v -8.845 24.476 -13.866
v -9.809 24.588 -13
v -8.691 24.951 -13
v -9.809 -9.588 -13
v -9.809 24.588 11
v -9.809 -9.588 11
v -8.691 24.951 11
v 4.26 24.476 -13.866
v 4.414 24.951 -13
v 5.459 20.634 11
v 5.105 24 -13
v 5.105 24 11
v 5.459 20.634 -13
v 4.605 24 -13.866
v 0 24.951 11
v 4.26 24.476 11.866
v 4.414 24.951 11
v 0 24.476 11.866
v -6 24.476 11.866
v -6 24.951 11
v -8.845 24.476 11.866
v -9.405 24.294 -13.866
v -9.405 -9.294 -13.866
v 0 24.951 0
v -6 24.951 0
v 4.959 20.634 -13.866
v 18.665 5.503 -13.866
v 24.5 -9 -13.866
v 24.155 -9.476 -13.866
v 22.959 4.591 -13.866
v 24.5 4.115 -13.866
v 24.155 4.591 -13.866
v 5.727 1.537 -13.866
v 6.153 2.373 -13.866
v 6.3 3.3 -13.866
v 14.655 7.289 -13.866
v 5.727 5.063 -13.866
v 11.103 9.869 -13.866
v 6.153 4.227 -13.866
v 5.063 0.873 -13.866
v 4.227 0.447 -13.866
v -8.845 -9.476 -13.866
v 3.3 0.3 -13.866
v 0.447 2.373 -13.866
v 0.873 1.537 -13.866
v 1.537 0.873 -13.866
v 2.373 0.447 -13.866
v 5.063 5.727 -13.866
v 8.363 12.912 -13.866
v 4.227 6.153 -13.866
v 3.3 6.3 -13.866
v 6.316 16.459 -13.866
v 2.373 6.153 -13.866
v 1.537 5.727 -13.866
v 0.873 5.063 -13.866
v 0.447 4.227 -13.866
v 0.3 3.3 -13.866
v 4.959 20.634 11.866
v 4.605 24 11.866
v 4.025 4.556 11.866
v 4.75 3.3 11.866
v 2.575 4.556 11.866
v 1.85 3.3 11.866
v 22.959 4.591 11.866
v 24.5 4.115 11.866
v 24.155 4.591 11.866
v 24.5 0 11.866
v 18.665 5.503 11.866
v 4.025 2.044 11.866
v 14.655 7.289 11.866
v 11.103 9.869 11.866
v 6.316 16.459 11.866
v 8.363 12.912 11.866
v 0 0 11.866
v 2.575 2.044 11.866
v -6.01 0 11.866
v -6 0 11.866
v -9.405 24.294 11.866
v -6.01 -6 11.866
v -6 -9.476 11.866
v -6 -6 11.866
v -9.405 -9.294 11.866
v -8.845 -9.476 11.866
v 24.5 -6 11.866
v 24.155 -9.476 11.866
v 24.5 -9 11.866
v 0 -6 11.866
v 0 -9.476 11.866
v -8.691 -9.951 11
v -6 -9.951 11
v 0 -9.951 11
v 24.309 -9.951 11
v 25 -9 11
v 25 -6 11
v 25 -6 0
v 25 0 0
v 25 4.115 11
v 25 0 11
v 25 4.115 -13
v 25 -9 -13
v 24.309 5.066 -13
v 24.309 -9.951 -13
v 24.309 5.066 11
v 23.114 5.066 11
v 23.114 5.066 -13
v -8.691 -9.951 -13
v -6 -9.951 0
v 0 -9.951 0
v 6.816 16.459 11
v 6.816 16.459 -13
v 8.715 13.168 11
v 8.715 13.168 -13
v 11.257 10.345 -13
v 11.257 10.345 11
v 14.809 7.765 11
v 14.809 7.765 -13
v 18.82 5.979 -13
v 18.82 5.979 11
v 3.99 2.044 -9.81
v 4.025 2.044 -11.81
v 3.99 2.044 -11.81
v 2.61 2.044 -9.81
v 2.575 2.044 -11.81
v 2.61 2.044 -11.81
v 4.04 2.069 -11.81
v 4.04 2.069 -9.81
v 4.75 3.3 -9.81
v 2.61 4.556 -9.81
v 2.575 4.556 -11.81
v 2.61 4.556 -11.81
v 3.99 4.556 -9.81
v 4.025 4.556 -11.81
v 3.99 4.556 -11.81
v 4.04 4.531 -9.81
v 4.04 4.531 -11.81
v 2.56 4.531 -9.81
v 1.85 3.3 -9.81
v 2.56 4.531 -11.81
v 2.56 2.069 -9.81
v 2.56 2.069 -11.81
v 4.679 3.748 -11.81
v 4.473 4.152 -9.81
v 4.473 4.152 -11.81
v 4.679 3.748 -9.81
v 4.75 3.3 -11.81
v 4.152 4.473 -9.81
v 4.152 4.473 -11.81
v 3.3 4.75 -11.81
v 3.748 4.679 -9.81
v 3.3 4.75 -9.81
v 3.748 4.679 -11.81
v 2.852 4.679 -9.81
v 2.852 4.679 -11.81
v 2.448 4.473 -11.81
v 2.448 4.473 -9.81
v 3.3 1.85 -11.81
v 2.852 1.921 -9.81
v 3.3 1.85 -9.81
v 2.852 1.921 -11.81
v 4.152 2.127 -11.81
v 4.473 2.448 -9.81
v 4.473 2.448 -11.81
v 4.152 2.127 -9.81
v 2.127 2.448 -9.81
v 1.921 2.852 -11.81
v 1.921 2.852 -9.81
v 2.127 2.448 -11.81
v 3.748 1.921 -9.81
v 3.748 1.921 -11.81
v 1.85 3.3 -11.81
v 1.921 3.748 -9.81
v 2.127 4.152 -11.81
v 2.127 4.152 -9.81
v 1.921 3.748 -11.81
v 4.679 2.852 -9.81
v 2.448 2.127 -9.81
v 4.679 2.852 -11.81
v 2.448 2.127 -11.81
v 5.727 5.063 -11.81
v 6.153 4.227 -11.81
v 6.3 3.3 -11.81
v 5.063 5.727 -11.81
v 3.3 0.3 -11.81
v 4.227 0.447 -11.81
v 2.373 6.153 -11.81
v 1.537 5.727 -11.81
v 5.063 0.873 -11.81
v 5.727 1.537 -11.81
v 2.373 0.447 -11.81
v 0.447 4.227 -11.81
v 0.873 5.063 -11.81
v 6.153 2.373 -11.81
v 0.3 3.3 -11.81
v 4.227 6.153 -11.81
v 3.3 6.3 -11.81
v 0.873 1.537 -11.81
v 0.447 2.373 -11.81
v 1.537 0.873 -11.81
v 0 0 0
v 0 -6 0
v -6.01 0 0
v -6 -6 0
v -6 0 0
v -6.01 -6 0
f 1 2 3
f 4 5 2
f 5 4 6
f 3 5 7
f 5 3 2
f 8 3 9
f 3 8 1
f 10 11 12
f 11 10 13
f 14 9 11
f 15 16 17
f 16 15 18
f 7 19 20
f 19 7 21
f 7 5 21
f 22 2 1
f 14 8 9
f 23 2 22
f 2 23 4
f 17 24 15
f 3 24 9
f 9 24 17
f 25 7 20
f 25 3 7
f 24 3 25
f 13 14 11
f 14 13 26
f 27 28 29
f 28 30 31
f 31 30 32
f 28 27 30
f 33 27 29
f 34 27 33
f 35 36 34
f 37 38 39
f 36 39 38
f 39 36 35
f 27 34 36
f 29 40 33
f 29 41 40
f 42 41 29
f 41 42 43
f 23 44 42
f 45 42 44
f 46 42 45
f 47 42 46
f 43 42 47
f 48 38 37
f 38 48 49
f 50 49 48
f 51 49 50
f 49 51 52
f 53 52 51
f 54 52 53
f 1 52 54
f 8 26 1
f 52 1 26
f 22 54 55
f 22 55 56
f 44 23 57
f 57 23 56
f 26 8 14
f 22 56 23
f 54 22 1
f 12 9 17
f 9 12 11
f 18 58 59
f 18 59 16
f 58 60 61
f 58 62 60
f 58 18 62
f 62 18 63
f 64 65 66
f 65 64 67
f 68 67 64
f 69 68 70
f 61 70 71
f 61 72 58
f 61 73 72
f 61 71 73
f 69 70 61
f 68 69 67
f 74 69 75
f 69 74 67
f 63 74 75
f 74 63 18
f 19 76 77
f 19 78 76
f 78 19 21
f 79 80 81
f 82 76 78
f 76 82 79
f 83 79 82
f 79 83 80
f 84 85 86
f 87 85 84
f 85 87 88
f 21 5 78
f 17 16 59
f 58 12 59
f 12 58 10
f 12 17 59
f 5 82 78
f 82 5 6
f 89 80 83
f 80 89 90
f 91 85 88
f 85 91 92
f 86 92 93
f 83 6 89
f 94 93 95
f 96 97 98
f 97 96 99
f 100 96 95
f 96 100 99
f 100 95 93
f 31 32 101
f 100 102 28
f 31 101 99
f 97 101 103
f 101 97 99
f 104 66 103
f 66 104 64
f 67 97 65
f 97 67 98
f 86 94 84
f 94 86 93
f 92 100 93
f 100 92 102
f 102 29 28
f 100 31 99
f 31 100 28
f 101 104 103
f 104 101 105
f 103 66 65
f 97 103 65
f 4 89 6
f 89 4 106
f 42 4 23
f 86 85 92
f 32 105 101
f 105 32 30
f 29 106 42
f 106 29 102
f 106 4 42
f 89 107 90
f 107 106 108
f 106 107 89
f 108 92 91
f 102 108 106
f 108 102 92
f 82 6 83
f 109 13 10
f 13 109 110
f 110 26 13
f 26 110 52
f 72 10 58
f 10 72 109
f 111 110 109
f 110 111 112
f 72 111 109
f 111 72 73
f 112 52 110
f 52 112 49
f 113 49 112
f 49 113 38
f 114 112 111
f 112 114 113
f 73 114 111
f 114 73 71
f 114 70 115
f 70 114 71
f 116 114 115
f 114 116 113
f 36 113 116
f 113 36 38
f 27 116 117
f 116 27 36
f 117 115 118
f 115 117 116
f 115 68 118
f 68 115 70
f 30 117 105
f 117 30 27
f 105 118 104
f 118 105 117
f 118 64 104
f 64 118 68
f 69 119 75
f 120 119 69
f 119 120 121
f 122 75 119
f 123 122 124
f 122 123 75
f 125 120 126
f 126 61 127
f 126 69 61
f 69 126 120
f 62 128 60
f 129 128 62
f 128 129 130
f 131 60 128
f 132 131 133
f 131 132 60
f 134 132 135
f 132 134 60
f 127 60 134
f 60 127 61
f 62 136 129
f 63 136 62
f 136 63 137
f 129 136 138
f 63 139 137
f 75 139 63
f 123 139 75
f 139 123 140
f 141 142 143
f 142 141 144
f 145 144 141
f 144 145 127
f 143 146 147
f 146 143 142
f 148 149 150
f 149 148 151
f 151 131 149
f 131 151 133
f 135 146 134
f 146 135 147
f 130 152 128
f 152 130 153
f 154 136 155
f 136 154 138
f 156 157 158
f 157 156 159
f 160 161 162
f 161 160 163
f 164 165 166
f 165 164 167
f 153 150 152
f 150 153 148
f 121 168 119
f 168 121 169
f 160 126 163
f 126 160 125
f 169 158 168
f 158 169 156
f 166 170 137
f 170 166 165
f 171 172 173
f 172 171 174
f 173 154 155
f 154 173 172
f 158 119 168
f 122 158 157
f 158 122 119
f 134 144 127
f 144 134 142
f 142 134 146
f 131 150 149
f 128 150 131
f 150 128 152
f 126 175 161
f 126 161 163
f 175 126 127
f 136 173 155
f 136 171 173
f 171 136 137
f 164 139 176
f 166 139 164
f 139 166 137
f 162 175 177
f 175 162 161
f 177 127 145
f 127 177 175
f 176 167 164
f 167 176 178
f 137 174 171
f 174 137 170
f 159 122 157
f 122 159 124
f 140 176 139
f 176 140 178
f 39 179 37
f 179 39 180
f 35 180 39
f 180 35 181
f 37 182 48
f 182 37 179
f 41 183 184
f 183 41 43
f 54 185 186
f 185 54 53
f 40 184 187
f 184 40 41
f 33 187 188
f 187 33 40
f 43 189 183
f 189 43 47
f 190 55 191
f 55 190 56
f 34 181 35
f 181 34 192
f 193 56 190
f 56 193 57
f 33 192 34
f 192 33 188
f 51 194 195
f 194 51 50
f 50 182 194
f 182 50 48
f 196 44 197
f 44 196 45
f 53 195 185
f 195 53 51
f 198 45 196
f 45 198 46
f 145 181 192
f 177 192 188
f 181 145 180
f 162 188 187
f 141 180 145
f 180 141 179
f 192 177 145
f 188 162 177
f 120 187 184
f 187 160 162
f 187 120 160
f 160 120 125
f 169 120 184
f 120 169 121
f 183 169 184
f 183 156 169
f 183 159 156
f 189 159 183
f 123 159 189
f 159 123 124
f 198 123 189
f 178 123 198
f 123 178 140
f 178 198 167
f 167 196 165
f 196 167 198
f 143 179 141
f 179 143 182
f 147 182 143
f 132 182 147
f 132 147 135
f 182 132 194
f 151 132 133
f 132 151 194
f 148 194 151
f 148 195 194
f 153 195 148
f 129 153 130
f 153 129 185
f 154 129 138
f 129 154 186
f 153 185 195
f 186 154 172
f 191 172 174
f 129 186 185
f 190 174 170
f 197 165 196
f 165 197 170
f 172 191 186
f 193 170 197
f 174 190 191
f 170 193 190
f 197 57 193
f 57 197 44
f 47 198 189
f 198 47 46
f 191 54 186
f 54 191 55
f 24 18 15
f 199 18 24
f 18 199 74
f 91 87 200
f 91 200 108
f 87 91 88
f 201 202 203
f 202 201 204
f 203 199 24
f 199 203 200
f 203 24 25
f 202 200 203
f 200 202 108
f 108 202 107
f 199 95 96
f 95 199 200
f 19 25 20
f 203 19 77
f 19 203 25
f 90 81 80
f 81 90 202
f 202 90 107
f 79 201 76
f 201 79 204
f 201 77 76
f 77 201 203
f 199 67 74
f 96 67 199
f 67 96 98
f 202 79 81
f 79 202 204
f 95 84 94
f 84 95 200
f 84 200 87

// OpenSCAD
// The real added height
bottomHeight=14;

// Internal height (snug fit)
internalHeight=12;

// Rounded corner radius
roundness=1;

// How big is the thing in the horizontal plane
cubeSide= 25;

// Wall thickness
outSide= 4;

// Plywood thickness
plyWidth= 6;



// This is rev 2 for thingiverse customizer
// MoonCactus / jeremie.francois@gmail.com / betterprinter.blogspot.com

// The screw data match a standard UM spare
screwDiameter=2.9+0;
screwDistToWalls=0.8+0;
screwHeadDiameter=6+0;
screwHeadDepth=2.2+0;

tol=0.01+0;

translate([-plyWidth-outSide,-plyWidth-outSide,0])
{
	difference()
	{

		minkowski()
		{
			sphere(r=1); // round the main body shape
			difference()
			{

				// Main body
				translate([roundness,roundness,-bottomHeight+roundness])
					cube([cubeSide + plyWidth + outSide -roundness*2, cubeSide + plyWidth + outSide -roundness*2, internalHeight+bottomHeight -roundness*2]);
				// Main cylinder removal
				translate([cubeSide + plyWidth + outSide, cubeSide + plyWidth + outSide,-bottomHeight+roundness-tol])
					cylinder(r=cubeSide-outSide, h=internalHeight+bottomHeight-roundness*2+tol*2);
			}
		}

		// The two grooves (one of them being blind on one side)
		translate([outSide,-tol,0]) cube([plyWidth, cubeSide+plyWidth+outSide+tol*2, internalHeight+tol]);
		translate([-tol+outSide,outSide,0]) cube([cubeSide+plyWidth+tol*2, plyWidth, internalHeight+tol]);

		// Hole for a screw to attach a rubber pad AND to pushes the feet wals against that of the UM for stickier fit
		translate([cubeSide/2+screwDistToWalls, cubeSide/2+screwDistToWalls,-bottomHeight-tol])
		{
			cylinder(r=screwDiameter/2, h=internalHeight+bottomHeight+tol*2, $fn=6);
			cylinder(r=screwDiameter/2, h=screwHeadDepth+2, $fn=20); // 2 easy millimeters to facilitate screwing the screw 
			cylinder(r=screwHeadDiameter/2, h=screwHeadDepth, $fn=20);
		}		


	}
}
